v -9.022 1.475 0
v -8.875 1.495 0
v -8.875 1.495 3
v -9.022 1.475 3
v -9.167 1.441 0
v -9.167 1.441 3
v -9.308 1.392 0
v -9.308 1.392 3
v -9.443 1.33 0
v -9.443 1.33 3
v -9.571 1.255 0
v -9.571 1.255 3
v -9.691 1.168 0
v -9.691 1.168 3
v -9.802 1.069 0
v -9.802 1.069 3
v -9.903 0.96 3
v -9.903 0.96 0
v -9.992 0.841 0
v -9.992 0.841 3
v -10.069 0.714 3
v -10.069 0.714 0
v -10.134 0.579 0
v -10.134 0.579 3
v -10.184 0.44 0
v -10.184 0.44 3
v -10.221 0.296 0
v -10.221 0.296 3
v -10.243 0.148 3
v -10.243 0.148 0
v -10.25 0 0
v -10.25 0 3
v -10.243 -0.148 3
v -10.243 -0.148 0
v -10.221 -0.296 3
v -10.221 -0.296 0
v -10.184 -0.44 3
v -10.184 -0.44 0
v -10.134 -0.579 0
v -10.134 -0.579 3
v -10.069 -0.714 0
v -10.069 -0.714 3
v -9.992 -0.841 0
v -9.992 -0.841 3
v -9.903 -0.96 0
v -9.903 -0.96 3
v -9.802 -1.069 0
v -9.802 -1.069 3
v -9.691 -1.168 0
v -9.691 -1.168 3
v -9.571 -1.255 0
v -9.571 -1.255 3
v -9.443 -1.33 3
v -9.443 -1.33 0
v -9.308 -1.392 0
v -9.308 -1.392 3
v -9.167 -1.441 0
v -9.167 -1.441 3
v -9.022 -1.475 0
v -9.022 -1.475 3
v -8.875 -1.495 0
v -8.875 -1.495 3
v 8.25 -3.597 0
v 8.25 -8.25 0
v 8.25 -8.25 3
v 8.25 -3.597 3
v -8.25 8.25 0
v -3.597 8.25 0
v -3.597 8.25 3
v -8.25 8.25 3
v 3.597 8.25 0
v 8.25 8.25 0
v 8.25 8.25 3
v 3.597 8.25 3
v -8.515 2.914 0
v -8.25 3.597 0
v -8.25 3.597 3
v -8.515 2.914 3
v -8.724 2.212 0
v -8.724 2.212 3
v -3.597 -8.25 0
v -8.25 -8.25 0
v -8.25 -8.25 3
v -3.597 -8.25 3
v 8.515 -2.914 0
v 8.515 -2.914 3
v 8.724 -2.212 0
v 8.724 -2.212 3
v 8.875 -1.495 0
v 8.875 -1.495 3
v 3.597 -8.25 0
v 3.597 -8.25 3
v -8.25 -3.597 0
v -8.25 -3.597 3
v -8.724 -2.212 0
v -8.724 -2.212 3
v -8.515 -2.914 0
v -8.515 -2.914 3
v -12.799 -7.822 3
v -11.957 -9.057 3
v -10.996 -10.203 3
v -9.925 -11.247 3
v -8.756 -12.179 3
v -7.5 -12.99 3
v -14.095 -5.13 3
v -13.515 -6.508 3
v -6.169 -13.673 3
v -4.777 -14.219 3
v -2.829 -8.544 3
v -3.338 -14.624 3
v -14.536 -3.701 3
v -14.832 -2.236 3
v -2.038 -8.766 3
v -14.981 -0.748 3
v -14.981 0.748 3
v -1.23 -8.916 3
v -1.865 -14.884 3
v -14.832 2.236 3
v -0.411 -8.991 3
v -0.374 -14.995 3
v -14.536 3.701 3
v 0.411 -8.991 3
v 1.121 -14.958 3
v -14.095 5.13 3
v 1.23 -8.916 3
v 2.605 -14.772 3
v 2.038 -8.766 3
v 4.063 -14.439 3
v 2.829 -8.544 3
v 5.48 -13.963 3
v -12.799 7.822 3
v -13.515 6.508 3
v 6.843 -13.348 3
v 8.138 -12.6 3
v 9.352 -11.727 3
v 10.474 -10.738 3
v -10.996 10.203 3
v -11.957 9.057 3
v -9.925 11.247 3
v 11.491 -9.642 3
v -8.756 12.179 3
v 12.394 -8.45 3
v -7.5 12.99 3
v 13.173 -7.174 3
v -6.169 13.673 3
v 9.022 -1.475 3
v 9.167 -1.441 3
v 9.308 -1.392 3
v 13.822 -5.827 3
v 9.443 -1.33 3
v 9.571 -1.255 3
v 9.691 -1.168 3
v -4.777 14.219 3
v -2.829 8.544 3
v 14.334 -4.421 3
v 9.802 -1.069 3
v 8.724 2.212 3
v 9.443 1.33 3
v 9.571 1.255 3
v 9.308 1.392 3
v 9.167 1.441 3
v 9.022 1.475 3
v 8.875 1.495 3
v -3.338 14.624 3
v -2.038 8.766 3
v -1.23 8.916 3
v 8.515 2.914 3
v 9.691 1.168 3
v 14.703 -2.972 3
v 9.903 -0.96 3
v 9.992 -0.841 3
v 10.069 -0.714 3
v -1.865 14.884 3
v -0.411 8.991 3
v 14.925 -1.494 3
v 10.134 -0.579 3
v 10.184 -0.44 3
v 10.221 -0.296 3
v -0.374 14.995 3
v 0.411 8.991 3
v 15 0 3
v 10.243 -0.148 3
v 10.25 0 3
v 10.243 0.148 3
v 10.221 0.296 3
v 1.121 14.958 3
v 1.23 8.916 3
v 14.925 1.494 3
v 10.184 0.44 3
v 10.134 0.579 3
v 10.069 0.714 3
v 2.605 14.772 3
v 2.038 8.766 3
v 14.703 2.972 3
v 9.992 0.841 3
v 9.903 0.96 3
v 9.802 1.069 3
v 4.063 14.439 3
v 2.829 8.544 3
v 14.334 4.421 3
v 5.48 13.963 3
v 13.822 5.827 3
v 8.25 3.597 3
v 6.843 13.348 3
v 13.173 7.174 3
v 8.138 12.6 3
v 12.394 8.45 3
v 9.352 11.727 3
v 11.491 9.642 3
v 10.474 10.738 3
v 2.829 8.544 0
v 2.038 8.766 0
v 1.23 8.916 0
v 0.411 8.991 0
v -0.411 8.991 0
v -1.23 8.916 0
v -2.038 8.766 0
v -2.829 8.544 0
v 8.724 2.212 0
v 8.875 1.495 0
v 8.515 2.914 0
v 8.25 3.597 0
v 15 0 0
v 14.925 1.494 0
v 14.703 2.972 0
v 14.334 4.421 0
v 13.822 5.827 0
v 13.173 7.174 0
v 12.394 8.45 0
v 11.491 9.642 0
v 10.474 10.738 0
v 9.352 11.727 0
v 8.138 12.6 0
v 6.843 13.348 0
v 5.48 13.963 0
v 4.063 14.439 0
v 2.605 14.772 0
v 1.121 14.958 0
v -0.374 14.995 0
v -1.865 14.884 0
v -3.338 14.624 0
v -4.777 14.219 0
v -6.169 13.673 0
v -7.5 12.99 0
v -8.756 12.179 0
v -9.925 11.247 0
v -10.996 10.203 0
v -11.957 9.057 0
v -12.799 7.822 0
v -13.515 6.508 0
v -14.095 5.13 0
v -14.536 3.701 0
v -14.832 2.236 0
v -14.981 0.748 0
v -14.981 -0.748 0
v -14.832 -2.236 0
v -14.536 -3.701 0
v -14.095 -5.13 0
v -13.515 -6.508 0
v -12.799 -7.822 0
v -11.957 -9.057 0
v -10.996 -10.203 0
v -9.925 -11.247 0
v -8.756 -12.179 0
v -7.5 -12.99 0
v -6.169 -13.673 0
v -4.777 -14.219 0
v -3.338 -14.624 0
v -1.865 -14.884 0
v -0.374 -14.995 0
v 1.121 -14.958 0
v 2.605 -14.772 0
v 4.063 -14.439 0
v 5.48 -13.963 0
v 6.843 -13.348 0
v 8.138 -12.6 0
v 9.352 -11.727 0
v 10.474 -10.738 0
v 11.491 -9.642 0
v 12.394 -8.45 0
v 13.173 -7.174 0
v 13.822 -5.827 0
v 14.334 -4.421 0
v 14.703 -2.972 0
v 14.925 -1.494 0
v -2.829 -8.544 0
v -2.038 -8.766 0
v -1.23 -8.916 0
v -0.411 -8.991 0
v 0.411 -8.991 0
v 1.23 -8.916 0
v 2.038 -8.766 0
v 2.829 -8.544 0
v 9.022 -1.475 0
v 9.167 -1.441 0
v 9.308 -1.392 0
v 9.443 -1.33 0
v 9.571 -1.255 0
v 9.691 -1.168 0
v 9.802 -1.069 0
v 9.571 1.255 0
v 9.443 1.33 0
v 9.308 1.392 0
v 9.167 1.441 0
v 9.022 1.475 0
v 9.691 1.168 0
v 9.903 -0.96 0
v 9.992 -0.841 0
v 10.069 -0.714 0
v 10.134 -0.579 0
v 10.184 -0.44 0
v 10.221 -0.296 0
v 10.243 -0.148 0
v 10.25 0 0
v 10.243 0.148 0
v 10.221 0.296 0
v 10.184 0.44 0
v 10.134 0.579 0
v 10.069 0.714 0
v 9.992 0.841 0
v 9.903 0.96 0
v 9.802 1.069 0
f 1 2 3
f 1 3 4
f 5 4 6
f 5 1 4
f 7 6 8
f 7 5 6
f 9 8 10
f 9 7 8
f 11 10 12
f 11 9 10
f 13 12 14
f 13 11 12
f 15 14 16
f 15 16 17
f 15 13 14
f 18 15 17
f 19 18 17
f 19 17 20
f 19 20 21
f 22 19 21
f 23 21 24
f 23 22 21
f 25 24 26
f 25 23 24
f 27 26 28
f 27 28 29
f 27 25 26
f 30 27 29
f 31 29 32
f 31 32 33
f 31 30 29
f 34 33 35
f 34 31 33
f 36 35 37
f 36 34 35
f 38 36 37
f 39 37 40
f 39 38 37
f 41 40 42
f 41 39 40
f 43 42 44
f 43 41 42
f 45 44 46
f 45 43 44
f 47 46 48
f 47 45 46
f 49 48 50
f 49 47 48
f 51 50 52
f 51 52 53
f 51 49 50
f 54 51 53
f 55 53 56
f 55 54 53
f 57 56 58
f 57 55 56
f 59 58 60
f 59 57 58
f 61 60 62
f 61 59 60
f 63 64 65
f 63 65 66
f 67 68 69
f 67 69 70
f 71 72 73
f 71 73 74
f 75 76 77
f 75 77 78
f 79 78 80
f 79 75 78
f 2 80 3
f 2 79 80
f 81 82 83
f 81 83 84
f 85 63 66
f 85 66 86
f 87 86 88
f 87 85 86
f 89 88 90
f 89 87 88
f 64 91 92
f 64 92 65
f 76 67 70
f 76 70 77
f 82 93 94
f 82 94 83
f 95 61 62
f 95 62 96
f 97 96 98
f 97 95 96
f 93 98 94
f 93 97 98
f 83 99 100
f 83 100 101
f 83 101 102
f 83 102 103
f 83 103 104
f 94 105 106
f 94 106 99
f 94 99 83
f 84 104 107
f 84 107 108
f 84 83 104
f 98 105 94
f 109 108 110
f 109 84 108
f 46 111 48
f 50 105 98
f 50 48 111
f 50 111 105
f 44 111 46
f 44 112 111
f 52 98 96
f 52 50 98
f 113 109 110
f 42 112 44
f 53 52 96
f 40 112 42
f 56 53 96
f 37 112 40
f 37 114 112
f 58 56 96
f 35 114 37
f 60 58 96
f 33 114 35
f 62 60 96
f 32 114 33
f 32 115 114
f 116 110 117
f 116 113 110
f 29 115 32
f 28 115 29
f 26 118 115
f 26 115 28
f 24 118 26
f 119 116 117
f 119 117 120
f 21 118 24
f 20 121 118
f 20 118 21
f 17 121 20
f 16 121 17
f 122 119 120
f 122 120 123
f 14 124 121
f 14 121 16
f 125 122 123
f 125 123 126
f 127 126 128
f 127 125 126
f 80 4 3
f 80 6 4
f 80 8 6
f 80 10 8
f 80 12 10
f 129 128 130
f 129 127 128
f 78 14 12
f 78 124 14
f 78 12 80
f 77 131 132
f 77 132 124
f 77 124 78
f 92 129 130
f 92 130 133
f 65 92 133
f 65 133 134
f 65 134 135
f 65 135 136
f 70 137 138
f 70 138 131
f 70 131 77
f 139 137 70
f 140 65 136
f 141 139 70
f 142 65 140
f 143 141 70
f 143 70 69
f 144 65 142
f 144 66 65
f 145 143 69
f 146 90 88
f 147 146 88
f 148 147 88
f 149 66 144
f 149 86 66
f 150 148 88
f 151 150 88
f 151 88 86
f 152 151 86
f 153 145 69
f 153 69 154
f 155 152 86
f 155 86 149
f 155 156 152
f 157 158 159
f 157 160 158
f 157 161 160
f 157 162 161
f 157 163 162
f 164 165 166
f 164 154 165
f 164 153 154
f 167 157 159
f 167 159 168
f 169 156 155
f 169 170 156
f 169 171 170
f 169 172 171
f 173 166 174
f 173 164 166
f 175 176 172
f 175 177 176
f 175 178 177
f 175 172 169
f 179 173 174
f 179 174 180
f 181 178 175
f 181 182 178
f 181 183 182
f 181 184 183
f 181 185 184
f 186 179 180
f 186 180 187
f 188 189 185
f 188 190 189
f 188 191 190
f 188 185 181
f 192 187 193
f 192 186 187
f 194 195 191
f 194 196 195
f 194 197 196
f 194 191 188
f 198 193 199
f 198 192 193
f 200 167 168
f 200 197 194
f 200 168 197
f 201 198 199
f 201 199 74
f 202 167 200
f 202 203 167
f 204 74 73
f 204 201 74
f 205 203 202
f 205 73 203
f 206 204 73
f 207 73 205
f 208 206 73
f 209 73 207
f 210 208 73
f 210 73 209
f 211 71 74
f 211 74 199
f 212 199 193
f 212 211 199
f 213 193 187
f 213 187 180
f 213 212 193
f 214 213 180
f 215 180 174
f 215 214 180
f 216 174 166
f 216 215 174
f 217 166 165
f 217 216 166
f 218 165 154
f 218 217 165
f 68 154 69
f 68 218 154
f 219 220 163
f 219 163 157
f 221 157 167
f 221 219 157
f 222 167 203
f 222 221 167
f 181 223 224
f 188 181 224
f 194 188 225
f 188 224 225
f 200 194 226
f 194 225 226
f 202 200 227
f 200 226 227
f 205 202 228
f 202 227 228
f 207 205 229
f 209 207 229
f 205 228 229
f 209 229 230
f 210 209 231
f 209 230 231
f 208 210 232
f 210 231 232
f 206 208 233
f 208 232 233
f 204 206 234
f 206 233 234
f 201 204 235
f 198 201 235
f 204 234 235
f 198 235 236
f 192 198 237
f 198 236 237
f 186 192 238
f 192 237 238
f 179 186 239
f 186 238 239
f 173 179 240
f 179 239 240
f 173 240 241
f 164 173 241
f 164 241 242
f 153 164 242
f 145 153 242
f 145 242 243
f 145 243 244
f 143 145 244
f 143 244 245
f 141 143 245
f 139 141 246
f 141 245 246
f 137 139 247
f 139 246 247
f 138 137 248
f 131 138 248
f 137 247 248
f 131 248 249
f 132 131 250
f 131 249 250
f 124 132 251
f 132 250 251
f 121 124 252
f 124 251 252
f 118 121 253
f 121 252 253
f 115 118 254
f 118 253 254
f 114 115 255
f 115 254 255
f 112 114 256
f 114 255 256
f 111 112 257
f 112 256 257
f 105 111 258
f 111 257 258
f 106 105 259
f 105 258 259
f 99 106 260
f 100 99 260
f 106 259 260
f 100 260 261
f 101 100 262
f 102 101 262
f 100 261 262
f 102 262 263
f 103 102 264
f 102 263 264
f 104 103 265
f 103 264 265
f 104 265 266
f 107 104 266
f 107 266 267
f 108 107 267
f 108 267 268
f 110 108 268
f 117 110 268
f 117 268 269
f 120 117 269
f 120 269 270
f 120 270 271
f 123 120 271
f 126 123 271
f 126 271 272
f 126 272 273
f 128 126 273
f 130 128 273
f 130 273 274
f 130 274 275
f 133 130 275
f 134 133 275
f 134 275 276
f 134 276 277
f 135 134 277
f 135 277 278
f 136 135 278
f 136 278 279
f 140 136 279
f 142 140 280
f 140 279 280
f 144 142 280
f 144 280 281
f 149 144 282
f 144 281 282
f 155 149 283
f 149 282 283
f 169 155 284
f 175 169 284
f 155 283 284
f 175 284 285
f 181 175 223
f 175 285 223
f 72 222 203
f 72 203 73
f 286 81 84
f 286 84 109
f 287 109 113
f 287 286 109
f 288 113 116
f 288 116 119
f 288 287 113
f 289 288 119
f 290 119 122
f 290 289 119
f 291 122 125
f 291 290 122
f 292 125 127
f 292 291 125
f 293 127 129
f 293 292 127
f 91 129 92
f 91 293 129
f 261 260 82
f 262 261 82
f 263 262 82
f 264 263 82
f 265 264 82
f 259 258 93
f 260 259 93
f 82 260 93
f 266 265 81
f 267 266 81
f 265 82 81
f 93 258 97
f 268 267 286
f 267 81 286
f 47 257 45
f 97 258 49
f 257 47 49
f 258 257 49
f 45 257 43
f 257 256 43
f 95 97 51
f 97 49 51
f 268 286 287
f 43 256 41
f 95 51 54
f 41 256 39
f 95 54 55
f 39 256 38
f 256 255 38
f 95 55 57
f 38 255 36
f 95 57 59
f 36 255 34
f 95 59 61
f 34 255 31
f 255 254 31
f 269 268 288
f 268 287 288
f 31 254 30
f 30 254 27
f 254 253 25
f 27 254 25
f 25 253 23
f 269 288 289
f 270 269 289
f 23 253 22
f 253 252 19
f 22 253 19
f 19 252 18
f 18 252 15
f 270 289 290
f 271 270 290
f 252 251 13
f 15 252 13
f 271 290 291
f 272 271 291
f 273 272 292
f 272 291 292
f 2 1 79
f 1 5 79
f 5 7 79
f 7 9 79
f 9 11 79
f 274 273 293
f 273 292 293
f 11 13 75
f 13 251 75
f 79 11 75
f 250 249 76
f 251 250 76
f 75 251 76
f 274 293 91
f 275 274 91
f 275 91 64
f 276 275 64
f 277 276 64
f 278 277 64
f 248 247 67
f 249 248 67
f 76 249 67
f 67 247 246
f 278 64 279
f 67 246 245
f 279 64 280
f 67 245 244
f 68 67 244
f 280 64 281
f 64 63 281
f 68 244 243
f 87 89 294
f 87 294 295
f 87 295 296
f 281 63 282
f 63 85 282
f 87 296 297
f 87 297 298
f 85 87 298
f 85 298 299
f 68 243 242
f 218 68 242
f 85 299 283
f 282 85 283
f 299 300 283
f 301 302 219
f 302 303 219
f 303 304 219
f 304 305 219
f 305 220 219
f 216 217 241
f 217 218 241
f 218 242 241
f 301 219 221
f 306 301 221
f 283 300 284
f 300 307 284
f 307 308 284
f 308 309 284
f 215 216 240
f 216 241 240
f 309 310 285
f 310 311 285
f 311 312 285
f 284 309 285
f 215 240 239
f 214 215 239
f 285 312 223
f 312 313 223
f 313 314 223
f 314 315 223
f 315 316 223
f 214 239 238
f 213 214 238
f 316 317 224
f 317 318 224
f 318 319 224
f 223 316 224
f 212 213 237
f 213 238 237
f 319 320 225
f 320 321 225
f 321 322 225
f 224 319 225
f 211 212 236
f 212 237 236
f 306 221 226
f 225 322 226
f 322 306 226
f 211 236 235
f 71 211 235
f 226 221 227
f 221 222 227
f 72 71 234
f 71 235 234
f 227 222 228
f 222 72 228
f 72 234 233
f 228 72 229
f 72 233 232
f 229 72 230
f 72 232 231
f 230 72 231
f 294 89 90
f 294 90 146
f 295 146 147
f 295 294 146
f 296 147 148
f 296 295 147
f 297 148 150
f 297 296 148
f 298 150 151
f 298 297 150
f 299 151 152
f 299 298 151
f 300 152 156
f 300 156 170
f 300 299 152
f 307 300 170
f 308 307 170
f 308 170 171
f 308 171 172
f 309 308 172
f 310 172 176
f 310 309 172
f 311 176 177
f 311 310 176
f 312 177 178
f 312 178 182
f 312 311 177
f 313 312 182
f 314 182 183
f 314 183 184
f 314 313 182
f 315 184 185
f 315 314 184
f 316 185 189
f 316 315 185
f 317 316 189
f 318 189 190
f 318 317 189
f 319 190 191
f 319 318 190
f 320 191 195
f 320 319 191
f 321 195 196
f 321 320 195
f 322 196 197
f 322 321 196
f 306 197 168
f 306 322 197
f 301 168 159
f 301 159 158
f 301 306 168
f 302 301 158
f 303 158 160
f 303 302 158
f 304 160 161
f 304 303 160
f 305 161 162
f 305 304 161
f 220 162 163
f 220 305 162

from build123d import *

# Parameters (mm, degrees)
SKETCH1_R           = 15
BOSS_EXTRUDE1_DEPTH = 3


with BuildPart() as part:
    # Sketch1 → Boss-Extrude1 (new body)
    with BuildSketch(Plane.XY):
        Circle(SKETCH1_R)
        with BuildLine():
            ThreePointArc((8.875, 1.494782593), (8.626766656, 2.564936072), (8.25, 3.596873642))
            Line((8.25, 3.596873642), (8.25, 8.25))
            Line((8.25, 8.25), (3.596873642, 8.25))
            ThreePointArc((3.596873642, 8.25), (0, 9), (-3.596873642, 8.25))
            Line((-3.596873642, 8.25), (-8.25, 8.25))
            Line((-8.25, 8.25), (-8.25, 3.596873642))
            ThreePointArc((-8.25, 3.596873642), (-8.626766656, 2.564936072), (-8.875, 1.494782593))
            ThreePointArc((-8.875, 1.494782593), (-10.25, 0), (-8.875, -1.494782593))
            ThreePointArc((-8.875, -1.494782593), (-8.626766656, -2.564936072), (-8.25, -3.596873642))
            Line((-8.25, -3.596873642), (-8.25, -8.25))
            Line((-8.25, -8.25), (-3.596873642, -8.25))
            ThreePointArc((-3.596873642, -8.25), (0, -9), (3.596873642, -8.25))
            Line((3.596873642, -8.25), (8.25, -8.25))
            Line((8.25, -8.25), (8.25, -3.596873642))
            ThreePointArc((8.25, -3.596873642), (8.626766656, -2.564936072), (8.875, -1.494782593))
            ThreePointArc((8.875, -1.494782593), (10.25, 0), (8.875, 1.494782593))
        make_face(mode=Mode.SUBTRACT)
    extrude(amount=BOSS_EXTRUDE1_DEPTH)


solid = part.part
